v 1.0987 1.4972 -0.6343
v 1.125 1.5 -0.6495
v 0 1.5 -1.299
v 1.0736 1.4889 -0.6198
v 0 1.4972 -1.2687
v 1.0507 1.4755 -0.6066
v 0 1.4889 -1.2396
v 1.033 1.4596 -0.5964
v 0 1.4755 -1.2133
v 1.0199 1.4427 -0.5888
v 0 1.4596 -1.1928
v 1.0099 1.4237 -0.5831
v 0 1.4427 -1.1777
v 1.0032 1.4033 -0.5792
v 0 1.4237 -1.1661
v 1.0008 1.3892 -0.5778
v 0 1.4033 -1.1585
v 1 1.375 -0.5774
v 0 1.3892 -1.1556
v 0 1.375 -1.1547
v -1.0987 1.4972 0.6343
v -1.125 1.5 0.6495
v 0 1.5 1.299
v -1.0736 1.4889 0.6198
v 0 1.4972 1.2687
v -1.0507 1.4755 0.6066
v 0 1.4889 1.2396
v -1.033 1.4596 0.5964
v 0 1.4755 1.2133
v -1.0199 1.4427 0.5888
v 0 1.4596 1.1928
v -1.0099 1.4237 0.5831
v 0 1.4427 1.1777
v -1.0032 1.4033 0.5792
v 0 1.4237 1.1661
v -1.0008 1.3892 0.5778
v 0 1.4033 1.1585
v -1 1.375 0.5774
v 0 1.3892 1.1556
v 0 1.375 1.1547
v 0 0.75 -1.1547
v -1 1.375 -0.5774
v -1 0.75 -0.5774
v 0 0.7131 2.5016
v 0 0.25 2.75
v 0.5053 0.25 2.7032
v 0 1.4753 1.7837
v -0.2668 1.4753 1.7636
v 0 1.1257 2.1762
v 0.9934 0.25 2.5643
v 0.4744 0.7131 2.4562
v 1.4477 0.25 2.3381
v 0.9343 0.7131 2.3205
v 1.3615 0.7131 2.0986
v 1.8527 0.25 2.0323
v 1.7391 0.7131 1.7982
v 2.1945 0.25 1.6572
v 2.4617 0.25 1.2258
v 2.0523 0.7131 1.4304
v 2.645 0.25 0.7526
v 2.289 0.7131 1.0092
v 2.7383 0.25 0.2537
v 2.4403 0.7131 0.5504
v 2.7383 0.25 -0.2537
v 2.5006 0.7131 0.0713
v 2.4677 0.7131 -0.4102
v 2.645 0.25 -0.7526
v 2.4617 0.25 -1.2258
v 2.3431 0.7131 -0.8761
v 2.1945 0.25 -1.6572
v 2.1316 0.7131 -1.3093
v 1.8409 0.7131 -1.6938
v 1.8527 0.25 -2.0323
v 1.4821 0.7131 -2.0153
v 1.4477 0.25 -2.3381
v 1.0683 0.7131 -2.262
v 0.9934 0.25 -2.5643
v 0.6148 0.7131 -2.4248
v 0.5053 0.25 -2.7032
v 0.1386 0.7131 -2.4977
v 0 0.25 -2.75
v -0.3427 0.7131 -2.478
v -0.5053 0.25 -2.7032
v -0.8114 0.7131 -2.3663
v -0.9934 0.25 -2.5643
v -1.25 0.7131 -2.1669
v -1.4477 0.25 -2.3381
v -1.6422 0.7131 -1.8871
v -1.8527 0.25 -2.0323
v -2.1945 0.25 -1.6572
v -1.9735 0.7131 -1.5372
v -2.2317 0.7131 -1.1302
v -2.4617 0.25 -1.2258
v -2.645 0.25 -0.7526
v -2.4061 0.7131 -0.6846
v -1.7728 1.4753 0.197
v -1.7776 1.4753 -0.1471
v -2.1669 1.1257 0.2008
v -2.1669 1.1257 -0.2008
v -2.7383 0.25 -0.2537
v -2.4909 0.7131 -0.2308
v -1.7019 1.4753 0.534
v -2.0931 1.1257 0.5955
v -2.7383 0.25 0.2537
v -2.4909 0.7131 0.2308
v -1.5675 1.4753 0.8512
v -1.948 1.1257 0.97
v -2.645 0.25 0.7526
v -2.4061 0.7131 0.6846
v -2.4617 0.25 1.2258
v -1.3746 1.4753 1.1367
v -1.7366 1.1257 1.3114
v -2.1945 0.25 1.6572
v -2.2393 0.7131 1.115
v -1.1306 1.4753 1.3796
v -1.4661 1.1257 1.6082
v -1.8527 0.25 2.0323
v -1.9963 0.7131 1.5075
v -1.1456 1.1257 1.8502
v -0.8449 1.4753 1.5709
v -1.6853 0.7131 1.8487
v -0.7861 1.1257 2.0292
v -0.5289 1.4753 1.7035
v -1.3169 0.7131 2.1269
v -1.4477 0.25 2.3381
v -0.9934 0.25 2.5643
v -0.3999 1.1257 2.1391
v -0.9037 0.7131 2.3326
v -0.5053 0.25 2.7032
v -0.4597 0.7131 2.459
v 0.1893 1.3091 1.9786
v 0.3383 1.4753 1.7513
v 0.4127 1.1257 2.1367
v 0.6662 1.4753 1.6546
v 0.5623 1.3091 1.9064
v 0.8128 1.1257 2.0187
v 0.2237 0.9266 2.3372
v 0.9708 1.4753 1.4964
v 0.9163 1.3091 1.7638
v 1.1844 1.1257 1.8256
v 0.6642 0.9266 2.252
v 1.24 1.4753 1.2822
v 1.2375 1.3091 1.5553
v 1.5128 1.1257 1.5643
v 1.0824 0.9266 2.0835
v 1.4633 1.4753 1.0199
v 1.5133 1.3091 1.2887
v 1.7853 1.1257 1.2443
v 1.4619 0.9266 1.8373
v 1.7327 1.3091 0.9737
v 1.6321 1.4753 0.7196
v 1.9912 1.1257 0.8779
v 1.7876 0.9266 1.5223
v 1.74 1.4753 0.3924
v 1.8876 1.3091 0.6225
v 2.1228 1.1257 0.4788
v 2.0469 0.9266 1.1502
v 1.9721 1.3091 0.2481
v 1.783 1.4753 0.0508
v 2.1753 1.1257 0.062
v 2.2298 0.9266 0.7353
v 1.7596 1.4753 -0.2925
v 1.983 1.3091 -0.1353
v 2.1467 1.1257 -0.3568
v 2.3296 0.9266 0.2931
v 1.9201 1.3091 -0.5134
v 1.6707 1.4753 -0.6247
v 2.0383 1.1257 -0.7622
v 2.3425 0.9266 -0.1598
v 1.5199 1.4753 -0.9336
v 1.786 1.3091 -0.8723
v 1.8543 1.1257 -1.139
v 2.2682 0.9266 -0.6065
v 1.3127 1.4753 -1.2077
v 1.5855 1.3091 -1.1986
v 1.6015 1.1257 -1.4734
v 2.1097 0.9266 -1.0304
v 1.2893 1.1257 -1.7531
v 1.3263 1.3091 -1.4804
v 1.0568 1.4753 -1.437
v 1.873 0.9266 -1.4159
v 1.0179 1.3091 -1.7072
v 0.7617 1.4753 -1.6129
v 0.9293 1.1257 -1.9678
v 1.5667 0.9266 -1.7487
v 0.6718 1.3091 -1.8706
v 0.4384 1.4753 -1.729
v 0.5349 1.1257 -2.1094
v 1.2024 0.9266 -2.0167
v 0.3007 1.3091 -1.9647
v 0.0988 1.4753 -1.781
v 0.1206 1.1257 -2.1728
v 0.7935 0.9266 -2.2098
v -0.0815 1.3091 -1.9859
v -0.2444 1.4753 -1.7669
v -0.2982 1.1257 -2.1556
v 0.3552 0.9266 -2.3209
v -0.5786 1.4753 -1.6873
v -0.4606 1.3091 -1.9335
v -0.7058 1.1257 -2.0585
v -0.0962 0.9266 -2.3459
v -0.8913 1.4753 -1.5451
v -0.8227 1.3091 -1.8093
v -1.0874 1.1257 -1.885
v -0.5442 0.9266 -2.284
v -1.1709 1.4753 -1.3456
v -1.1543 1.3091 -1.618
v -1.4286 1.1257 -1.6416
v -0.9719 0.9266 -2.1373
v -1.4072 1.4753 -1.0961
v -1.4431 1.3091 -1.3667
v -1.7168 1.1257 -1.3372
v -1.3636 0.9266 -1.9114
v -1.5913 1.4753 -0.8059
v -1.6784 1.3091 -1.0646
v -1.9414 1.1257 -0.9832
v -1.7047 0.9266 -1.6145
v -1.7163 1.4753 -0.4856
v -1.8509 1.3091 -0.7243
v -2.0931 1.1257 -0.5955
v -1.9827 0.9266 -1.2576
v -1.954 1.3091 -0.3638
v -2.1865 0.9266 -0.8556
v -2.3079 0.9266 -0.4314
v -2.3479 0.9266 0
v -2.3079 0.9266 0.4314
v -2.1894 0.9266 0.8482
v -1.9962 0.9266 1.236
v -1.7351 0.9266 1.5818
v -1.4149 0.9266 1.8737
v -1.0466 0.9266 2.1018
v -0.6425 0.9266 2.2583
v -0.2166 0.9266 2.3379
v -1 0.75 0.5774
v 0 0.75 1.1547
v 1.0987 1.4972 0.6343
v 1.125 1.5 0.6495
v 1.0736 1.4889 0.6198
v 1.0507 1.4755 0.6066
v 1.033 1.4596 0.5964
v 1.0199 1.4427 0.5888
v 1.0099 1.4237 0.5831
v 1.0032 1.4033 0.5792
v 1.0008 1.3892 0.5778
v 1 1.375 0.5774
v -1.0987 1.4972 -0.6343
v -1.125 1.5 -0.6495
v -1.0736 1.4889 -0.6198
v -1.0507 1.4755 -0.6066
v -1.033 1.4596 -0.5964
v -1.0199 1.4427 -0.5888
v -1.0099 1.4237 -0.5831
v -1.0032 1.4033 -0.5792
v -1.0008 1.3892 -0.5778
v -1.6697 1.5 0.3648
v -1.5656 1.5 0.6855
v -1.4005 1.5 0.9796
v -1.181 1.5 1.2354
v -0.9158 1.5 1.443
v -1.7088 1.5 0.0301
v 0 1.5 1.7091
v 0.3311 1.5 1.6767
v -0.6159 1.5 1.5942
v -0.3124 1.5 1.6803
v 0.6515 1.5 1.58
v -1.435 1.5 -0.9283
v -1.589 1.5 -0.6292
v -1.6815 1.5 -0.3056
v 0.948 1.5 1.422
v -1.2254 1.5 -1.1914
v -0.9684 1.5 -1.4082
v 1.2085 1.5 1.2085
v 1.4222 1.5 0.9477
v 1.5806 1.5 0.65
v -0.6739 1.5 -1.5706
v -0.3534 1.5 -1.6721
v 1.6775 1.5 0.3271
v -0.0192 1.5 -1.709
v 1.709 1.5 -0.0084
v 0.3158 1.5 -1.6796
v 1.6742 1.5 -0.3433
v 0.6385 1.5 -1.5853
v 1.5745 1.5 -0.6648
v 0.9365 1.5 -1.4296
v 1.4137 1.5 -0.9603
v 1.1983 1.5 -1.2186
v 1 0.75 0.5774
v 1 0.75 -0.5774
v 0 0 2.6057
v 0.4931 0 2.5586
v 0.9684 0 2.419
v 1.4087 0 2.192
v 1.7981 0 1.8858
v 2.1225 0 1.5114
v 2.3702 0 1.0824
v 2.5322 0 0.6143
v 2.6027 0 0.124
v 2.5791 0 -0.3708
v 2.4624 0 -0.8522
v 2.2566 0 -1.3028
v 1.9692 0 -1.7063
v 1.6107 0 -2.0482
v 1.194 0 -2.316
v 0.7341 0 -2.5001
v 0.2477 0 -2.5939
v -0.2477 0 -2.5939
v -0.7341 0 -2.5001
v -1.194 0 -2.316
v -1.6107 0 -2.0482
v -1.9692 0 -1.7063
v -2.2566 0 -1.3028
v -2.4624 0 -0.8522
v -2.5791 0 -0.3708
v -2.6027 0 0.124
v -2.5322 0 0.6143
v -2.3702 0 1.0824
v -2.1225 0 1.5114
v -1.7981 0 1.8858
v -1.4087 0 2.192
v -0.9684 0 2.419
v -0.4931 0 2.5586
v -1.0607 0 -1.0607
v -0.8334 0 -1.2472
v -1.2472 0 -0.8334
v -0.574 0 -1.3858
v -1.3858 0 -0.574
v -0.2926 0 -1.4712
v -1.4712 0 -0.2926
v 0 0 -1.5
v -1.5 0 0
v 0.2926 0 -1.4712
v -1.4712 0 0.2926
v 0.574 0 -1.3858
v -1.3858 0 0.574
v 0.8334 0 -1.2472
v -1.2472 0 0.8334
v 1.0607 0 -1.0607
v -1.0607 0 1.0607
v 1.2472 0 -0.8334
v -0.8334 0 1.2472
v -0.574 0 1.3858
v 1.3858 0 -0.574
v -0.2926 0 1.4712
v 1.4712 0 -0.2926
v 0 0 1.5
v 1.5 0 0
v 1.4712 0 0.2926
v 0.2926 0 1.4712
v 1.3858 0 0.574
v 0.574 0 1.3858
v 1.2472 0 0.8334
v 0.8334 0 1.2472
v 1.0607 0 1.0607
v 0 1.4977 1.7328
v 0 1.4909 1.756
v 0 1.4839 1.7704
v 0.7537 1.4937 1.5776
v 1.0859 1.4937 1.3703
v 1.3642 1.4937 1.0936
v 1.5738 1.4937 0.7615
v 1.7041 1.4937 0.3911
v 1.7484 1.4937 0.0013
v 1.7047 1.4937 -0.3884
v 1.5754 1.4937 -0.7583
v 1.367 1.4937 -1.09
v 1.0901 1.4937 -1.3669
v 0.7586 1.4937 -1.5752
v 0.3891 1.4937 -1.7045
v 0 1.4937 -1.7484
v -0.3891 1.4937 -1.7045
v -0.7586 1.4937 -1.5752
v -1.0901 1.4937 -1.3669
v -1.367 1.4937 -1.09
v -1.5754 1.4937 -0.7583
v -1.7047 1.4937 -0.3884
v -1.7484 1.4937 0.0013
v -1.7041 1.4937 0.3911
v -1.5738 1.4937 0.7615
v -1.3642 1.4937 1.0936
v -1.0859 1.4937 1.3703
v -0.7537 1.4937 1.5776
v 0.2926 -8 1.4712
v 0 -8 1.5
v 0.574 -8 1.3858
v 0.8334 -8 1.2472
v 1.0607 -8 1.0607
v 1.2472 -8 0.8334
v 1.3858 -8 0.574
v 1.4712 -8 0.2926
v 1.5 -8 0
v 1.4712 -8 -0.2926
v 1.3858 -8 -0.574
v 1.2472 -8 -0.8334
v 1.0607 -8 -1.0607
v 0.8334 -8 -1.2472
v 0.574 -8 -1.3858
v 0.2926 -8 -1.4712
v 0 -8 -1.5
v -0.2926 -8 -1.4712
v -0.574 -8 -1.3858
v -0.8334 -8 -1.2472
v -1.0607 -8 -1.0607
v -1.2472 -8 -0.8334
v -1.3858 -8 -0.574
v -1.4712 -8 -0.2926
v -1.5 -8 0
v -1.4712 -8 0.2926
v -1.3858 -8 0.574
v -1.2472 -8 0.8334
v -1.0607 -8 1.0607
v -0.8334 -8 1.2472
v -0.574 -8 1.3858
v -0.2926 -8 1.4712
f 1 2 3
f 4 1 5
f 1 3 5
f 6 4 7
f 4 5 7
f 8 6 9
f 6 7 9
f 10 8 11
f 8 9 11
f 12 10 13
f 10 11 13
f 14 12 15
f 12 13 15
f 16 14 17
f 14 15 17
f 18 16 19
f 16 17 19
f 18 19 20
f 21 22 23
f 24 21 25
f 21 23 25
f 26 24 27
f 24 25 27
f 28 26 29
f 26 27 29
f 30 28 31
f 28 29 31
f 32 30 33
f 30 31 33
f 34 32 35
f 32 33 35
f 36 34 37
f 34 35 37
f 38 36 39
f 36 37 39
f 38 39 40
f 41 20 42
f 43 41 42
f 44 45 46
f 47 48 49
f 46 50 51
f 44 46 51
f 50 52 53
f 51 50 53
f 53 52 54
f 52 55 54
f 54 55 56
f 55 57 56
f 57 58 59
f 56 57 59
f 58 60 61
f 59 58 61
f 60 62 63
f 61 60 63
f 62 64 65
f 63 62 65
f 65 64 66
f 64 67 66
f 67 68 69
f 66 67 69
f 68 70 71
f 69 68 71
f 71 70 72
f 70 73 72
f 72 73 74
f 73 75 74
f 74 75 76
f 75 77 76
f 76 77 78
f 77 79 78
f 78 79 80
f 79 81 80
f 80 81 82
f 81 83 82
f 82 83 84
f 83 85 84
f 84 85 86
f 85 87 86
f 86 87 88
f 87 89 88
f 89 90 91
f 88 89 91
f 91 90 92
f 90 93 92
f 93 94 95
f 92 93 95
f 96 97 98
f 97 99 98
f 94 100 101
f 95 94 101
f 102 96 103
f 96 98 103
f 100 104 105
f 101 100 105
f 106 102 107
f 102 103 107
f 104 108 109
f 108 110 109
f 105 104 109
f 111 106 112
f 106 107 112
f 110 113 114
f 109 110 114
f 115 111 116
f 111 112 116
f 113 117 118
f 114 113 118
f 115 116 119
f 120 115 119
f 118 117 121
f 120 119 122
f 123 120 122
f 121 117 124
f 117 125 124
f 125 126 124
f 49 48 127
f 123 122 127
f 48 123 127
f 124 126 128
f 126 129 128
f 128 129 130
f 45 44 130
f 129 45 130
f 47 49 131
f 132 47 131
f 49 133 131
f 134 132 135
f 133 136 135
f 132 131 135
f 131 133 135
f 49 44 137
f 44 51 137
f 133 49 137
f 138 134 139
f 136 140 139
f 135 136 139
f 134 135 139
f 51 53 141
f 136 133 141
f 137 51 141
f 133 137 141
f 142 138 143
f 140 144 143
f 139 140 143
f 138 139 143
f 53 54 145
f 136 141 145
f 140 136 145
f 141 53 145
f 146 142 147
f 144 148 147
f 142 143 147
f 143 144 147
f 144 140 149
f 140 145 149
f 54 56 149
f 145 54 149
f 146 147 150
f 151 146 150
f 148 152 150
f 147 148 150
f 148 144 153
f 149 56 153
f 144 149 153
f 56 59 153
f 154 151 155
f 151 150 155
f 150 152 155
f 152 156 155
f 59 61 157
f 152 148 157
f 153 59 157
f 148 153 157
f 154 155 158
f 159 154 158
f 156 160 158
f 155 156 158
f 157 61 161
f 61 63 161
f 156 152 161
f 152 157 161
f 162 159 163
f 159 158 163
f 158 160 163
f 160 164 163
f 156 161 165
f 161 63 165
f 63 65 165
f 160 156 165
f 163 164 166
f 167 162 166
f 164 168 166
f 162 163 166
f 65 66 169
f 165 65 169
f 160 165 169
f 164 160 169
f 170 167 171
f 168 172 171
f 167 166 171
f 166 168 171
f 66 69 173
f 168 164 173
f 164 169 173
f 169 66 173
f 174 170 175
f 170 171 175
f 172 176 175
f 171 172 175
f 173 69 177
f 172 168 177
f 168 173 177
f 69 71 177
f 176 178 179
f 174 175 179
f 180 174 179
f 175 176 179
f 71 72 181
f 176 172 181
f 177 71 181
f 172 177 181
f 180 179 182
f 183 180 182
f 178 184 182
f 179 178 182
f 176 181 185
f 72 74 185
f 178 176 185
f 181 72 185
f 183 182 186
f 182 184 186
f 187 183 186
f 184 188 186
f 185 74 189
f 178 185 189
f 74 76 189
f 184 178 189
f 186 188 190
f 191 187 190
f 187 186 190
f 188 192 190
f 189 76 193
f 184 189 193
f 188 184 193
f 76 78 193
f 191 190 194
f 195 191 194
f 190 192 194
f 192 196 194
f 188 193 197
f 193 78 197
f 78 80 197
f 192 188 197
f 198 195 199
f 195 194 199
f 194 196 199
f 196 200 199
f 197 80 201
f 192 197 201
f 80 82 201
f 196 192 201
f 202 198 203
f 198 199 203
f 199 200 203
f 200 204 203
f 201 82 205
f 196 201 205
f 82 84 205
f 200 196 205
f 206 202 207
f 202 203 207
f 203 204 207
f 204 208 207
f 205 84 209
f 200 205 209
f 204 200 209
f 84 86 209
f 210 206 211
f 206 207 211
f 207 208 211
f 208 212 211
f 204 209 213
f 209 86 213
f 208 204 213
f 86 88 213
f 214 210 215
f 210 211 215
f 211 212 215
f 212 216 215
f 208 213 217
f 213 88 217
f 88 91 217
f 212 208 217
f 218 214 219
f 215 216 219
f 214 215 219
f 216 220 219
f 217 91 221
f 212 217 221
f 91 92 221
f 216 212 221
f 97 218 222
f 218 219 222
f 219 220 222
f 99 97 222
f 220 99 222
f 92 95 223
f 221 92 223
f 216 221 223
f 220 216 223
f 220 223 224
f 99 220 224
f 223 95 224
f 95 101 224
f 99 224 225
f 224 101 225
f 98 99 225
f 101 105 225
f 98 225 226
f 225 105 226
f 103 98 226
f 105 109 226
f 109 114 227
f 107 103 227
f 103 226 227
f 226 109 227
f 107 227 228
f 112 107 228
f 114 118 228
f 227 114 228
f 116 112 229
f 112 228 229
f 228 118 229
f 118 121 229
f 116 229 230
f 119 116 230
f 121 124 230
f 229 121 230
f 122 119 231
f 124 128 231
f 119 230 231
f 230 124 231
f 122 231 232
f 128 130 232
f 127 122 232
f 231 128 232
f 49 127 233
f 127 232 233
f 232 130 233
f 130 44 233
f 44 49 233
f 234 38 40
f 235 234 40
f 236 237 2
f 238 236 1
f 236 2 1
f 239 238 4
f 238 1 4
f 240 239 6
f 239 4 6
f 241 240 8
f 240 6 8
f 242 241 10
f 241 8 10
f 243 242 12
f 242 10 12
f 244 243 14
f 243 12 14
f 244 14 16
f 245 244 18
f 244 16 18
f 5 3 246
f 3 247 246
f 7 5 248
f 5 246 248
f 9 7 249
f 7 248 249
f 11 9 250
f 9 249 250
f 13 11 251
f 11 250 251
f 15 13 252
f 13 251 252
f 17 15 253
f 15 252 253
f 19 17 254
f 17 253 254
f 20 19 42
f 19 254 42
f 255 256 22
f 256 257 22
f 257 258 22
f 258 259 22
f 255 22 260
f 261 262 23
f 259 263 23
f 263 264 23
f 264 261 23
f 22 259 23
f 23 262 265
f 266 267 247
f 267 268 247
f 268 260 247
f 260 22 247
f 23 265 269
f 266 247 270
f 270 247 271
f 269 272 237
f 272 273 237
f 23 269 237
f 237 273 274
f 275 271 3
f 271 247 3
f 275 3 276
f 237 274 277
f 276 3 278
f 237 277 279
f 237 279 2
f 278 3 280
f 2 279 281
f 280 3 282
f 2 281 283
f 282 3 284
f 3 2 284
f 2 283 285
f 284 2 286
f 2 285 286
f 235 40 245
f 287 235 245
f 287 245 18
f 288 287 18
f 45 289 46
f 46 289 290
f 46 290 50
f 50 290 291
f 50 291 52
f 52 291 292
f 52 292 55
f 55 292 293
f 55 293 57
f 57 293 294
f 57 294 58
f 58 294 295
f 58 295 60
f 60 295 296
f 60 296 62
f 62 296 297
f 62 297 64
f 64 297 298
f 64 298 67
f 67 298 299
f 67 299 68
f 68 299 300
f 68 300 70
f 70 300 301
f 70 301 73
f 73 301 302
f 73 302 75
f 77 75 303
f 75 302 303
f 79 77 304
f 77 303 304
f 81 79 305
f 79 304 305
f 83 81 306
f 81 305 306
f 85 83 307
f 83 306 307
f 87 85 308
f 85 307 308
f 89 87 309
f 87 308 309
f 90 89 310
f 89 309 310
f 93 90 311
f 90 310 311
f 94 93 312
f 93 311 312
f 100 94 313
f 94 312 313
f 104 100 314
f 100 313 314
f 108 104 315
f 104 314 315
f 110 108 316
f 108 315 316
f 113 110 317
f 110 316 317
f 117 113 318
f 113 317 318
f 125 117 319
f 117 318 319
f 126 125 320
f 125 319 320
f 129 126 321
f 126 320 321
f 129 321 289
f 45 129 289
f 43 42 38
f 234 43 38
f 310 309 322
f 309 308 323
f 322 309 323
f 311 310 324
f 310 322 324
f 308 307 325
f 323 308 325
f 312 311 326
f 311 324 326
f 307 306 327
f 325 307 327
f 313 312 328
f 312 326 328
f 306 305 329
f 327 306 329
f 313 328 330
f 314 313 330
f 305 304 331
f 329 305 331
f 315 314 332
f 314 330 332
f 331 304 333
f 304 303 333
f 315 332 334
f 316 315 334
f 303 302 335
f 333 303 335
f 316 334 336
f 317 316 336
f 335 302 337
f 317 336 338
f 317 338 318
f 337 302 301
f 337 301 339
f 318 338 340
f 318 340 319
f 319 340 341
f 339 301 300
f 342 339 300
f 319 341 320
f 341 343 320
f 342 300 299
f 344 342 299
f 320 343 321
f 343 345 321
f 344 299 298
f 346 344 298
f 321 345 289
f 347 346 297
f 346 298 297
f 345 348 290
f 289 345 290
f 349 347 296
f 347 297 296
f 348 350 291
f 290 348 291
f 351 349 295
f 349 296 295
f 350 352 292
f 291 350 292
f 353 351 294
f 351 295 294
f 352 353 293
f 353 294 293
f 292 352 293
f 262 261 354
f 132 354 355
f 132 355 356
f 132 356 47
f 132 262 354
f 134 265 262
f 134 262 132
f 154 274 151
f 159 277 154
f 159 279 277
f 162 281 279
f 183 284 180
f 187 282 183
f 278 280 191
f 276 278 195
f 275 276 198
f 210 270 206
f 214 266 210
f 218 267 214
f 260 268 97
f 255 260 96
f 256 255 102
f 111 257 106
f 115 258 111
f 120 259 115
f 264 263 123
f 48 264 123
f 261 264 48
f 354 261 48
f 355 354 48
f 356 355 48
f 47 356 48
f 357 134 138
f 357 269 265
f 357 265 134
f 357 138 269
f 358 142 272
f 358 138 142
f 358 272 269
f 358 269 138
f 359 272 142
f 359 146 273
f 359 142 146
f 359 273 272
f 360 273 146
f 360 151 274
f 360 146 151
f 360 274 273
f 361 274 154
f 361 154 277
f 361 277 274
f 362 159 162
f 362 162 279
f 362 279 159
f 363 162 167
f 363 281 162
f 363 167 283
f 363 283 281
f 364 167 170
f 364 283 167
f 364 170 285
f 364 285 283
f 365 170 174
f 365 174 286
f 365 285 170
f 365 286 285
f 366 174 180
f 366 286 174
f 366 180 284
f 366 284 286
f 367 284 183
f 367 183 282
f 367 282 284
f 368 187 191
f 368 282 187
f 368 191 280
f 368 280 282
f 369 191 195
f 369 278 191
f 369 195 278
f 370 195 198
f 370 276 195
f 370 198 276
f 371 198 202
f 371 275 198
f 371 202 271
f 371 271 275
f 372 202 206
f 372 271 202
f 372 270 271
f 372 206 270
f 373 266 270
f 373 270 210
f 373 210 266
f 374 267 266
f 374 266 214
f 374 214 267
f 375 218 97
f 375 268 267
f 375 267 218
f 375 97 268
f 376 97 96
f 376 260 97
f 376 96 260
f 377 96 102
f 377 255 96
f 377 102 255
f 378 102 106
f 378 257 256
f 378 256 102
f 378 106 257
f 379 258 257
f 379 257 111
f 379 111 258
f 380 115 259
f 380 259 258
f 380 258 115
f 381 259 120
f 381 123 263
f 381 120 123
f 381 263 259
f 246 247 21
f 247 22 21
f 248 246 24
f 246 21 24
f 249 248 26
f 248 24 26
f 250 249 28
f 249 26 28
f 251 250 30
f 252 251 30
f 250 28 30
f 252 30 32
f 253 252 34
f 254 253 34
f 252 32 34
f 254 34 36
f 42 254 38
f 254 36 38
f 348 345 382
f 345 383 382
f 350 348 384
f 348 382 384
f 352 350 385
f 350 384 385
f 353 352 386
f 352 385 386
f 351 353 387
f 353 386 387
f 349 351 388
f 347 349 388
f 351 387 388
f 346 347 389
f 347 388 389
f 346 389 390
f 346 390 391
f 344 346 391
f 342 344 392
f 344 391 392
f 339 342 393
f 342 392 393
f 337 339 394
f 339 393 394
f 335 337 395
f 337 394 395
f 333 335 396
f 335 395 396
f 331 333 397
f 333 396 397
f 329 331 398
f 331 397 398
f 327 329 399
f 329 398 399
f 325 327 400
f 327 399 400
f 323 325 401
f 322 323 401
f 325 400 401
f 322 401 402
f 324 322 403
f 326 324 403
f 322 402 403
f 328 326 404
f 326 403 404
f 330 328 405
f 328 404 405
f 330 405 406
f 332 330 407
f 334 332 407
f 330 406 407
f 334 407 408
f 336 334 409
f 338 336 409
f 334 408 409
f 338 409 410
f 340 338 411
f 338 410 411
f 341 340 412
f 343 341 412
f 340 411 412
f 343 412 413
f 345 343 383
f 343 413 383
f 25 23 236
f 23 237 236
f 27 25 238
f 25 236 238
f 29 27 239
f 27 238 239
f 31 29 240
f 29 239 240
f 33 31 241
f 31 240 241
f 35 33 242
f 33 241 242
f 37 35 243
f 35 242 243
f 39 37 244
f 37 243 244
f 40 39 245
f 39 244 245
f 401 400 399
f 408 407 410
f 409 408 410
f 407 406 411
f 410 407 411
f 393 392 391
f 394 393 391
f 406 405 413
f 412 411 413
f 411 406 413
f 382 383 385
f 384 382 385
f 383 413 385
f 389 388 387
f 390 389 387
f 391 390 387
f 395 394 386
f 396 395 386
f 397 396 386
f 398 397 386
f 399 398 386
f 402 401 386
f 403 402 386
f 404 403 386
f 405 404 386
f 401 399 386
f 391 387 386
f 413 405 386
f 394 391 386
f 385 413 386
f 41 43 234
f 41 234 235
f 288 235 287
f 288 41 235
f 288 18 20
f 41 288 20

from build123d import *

# Parameters (mm, degrees)
CUT_EXTRUDE1_DEPTH = 0.75
FILLET1_R          = 0.125


with BuildPart() as part:
    # Sketch1 → Revolve1 (revolve)
    with BuildSketch(Plane(origin=(0, 0, 0), x_dir=(0, 0, -1), z_dir=(1, 0, 0))):
        with BuildLine():
            Line((0, 1.5), (-1.75, 1.5))
            ThreePointArc((-1.75, 1.5), (-2.334912942, 0.942930354), (-2.75, 0.25))
            Line((-2.75, 0.25), (-2.605662433, 0))
            Line((-2.605662433, 0), (-1.5, 0))
            Line((-1.5, 0), (-1.5, -8))
            Line((-1.5, -8), (0, -8))
            Line((0, -8), (0, 1.5))
        make_face()
    revolve(axis=Axis((0, -8, 0), (0, 1, 0)))

    # Sketch2 → Cut-Extrude1 (cut)
    with BuildSketch(Plane(origin=(0, 1.5, 0), x_dir=(1, 0, 0), z_dir=(0, 1, 0))):
        Polygon((0, 1.154700538), (-1, 0.577350269), (-1, -0.577350269), (0, -1.154700538), (1, -0.577350269), (1, 0.577350269), align=None)
    extrude(amount=-CUT_EXTRUDE1_DEPTH, mode=Mode.SUBTRACT)

    # Fillet1
    fillet1_edges = [part.edges().sort_by_distance(p)[0] for p in [
        (0.5, 1.5, -0.866025404),
        (-0.5, 1.5, -0.866025404),
        (-1, 1.5, 0),
        (-0.5, 1.5, 0.866025404),
        (0.5, 1.5, 0.866025404),
        (1, 1.5, 0),
        (0, 1.5, -1.75),
    ]]
    fillet(fillet1_edges, radius=FILLET1_R)


solid = part.part
